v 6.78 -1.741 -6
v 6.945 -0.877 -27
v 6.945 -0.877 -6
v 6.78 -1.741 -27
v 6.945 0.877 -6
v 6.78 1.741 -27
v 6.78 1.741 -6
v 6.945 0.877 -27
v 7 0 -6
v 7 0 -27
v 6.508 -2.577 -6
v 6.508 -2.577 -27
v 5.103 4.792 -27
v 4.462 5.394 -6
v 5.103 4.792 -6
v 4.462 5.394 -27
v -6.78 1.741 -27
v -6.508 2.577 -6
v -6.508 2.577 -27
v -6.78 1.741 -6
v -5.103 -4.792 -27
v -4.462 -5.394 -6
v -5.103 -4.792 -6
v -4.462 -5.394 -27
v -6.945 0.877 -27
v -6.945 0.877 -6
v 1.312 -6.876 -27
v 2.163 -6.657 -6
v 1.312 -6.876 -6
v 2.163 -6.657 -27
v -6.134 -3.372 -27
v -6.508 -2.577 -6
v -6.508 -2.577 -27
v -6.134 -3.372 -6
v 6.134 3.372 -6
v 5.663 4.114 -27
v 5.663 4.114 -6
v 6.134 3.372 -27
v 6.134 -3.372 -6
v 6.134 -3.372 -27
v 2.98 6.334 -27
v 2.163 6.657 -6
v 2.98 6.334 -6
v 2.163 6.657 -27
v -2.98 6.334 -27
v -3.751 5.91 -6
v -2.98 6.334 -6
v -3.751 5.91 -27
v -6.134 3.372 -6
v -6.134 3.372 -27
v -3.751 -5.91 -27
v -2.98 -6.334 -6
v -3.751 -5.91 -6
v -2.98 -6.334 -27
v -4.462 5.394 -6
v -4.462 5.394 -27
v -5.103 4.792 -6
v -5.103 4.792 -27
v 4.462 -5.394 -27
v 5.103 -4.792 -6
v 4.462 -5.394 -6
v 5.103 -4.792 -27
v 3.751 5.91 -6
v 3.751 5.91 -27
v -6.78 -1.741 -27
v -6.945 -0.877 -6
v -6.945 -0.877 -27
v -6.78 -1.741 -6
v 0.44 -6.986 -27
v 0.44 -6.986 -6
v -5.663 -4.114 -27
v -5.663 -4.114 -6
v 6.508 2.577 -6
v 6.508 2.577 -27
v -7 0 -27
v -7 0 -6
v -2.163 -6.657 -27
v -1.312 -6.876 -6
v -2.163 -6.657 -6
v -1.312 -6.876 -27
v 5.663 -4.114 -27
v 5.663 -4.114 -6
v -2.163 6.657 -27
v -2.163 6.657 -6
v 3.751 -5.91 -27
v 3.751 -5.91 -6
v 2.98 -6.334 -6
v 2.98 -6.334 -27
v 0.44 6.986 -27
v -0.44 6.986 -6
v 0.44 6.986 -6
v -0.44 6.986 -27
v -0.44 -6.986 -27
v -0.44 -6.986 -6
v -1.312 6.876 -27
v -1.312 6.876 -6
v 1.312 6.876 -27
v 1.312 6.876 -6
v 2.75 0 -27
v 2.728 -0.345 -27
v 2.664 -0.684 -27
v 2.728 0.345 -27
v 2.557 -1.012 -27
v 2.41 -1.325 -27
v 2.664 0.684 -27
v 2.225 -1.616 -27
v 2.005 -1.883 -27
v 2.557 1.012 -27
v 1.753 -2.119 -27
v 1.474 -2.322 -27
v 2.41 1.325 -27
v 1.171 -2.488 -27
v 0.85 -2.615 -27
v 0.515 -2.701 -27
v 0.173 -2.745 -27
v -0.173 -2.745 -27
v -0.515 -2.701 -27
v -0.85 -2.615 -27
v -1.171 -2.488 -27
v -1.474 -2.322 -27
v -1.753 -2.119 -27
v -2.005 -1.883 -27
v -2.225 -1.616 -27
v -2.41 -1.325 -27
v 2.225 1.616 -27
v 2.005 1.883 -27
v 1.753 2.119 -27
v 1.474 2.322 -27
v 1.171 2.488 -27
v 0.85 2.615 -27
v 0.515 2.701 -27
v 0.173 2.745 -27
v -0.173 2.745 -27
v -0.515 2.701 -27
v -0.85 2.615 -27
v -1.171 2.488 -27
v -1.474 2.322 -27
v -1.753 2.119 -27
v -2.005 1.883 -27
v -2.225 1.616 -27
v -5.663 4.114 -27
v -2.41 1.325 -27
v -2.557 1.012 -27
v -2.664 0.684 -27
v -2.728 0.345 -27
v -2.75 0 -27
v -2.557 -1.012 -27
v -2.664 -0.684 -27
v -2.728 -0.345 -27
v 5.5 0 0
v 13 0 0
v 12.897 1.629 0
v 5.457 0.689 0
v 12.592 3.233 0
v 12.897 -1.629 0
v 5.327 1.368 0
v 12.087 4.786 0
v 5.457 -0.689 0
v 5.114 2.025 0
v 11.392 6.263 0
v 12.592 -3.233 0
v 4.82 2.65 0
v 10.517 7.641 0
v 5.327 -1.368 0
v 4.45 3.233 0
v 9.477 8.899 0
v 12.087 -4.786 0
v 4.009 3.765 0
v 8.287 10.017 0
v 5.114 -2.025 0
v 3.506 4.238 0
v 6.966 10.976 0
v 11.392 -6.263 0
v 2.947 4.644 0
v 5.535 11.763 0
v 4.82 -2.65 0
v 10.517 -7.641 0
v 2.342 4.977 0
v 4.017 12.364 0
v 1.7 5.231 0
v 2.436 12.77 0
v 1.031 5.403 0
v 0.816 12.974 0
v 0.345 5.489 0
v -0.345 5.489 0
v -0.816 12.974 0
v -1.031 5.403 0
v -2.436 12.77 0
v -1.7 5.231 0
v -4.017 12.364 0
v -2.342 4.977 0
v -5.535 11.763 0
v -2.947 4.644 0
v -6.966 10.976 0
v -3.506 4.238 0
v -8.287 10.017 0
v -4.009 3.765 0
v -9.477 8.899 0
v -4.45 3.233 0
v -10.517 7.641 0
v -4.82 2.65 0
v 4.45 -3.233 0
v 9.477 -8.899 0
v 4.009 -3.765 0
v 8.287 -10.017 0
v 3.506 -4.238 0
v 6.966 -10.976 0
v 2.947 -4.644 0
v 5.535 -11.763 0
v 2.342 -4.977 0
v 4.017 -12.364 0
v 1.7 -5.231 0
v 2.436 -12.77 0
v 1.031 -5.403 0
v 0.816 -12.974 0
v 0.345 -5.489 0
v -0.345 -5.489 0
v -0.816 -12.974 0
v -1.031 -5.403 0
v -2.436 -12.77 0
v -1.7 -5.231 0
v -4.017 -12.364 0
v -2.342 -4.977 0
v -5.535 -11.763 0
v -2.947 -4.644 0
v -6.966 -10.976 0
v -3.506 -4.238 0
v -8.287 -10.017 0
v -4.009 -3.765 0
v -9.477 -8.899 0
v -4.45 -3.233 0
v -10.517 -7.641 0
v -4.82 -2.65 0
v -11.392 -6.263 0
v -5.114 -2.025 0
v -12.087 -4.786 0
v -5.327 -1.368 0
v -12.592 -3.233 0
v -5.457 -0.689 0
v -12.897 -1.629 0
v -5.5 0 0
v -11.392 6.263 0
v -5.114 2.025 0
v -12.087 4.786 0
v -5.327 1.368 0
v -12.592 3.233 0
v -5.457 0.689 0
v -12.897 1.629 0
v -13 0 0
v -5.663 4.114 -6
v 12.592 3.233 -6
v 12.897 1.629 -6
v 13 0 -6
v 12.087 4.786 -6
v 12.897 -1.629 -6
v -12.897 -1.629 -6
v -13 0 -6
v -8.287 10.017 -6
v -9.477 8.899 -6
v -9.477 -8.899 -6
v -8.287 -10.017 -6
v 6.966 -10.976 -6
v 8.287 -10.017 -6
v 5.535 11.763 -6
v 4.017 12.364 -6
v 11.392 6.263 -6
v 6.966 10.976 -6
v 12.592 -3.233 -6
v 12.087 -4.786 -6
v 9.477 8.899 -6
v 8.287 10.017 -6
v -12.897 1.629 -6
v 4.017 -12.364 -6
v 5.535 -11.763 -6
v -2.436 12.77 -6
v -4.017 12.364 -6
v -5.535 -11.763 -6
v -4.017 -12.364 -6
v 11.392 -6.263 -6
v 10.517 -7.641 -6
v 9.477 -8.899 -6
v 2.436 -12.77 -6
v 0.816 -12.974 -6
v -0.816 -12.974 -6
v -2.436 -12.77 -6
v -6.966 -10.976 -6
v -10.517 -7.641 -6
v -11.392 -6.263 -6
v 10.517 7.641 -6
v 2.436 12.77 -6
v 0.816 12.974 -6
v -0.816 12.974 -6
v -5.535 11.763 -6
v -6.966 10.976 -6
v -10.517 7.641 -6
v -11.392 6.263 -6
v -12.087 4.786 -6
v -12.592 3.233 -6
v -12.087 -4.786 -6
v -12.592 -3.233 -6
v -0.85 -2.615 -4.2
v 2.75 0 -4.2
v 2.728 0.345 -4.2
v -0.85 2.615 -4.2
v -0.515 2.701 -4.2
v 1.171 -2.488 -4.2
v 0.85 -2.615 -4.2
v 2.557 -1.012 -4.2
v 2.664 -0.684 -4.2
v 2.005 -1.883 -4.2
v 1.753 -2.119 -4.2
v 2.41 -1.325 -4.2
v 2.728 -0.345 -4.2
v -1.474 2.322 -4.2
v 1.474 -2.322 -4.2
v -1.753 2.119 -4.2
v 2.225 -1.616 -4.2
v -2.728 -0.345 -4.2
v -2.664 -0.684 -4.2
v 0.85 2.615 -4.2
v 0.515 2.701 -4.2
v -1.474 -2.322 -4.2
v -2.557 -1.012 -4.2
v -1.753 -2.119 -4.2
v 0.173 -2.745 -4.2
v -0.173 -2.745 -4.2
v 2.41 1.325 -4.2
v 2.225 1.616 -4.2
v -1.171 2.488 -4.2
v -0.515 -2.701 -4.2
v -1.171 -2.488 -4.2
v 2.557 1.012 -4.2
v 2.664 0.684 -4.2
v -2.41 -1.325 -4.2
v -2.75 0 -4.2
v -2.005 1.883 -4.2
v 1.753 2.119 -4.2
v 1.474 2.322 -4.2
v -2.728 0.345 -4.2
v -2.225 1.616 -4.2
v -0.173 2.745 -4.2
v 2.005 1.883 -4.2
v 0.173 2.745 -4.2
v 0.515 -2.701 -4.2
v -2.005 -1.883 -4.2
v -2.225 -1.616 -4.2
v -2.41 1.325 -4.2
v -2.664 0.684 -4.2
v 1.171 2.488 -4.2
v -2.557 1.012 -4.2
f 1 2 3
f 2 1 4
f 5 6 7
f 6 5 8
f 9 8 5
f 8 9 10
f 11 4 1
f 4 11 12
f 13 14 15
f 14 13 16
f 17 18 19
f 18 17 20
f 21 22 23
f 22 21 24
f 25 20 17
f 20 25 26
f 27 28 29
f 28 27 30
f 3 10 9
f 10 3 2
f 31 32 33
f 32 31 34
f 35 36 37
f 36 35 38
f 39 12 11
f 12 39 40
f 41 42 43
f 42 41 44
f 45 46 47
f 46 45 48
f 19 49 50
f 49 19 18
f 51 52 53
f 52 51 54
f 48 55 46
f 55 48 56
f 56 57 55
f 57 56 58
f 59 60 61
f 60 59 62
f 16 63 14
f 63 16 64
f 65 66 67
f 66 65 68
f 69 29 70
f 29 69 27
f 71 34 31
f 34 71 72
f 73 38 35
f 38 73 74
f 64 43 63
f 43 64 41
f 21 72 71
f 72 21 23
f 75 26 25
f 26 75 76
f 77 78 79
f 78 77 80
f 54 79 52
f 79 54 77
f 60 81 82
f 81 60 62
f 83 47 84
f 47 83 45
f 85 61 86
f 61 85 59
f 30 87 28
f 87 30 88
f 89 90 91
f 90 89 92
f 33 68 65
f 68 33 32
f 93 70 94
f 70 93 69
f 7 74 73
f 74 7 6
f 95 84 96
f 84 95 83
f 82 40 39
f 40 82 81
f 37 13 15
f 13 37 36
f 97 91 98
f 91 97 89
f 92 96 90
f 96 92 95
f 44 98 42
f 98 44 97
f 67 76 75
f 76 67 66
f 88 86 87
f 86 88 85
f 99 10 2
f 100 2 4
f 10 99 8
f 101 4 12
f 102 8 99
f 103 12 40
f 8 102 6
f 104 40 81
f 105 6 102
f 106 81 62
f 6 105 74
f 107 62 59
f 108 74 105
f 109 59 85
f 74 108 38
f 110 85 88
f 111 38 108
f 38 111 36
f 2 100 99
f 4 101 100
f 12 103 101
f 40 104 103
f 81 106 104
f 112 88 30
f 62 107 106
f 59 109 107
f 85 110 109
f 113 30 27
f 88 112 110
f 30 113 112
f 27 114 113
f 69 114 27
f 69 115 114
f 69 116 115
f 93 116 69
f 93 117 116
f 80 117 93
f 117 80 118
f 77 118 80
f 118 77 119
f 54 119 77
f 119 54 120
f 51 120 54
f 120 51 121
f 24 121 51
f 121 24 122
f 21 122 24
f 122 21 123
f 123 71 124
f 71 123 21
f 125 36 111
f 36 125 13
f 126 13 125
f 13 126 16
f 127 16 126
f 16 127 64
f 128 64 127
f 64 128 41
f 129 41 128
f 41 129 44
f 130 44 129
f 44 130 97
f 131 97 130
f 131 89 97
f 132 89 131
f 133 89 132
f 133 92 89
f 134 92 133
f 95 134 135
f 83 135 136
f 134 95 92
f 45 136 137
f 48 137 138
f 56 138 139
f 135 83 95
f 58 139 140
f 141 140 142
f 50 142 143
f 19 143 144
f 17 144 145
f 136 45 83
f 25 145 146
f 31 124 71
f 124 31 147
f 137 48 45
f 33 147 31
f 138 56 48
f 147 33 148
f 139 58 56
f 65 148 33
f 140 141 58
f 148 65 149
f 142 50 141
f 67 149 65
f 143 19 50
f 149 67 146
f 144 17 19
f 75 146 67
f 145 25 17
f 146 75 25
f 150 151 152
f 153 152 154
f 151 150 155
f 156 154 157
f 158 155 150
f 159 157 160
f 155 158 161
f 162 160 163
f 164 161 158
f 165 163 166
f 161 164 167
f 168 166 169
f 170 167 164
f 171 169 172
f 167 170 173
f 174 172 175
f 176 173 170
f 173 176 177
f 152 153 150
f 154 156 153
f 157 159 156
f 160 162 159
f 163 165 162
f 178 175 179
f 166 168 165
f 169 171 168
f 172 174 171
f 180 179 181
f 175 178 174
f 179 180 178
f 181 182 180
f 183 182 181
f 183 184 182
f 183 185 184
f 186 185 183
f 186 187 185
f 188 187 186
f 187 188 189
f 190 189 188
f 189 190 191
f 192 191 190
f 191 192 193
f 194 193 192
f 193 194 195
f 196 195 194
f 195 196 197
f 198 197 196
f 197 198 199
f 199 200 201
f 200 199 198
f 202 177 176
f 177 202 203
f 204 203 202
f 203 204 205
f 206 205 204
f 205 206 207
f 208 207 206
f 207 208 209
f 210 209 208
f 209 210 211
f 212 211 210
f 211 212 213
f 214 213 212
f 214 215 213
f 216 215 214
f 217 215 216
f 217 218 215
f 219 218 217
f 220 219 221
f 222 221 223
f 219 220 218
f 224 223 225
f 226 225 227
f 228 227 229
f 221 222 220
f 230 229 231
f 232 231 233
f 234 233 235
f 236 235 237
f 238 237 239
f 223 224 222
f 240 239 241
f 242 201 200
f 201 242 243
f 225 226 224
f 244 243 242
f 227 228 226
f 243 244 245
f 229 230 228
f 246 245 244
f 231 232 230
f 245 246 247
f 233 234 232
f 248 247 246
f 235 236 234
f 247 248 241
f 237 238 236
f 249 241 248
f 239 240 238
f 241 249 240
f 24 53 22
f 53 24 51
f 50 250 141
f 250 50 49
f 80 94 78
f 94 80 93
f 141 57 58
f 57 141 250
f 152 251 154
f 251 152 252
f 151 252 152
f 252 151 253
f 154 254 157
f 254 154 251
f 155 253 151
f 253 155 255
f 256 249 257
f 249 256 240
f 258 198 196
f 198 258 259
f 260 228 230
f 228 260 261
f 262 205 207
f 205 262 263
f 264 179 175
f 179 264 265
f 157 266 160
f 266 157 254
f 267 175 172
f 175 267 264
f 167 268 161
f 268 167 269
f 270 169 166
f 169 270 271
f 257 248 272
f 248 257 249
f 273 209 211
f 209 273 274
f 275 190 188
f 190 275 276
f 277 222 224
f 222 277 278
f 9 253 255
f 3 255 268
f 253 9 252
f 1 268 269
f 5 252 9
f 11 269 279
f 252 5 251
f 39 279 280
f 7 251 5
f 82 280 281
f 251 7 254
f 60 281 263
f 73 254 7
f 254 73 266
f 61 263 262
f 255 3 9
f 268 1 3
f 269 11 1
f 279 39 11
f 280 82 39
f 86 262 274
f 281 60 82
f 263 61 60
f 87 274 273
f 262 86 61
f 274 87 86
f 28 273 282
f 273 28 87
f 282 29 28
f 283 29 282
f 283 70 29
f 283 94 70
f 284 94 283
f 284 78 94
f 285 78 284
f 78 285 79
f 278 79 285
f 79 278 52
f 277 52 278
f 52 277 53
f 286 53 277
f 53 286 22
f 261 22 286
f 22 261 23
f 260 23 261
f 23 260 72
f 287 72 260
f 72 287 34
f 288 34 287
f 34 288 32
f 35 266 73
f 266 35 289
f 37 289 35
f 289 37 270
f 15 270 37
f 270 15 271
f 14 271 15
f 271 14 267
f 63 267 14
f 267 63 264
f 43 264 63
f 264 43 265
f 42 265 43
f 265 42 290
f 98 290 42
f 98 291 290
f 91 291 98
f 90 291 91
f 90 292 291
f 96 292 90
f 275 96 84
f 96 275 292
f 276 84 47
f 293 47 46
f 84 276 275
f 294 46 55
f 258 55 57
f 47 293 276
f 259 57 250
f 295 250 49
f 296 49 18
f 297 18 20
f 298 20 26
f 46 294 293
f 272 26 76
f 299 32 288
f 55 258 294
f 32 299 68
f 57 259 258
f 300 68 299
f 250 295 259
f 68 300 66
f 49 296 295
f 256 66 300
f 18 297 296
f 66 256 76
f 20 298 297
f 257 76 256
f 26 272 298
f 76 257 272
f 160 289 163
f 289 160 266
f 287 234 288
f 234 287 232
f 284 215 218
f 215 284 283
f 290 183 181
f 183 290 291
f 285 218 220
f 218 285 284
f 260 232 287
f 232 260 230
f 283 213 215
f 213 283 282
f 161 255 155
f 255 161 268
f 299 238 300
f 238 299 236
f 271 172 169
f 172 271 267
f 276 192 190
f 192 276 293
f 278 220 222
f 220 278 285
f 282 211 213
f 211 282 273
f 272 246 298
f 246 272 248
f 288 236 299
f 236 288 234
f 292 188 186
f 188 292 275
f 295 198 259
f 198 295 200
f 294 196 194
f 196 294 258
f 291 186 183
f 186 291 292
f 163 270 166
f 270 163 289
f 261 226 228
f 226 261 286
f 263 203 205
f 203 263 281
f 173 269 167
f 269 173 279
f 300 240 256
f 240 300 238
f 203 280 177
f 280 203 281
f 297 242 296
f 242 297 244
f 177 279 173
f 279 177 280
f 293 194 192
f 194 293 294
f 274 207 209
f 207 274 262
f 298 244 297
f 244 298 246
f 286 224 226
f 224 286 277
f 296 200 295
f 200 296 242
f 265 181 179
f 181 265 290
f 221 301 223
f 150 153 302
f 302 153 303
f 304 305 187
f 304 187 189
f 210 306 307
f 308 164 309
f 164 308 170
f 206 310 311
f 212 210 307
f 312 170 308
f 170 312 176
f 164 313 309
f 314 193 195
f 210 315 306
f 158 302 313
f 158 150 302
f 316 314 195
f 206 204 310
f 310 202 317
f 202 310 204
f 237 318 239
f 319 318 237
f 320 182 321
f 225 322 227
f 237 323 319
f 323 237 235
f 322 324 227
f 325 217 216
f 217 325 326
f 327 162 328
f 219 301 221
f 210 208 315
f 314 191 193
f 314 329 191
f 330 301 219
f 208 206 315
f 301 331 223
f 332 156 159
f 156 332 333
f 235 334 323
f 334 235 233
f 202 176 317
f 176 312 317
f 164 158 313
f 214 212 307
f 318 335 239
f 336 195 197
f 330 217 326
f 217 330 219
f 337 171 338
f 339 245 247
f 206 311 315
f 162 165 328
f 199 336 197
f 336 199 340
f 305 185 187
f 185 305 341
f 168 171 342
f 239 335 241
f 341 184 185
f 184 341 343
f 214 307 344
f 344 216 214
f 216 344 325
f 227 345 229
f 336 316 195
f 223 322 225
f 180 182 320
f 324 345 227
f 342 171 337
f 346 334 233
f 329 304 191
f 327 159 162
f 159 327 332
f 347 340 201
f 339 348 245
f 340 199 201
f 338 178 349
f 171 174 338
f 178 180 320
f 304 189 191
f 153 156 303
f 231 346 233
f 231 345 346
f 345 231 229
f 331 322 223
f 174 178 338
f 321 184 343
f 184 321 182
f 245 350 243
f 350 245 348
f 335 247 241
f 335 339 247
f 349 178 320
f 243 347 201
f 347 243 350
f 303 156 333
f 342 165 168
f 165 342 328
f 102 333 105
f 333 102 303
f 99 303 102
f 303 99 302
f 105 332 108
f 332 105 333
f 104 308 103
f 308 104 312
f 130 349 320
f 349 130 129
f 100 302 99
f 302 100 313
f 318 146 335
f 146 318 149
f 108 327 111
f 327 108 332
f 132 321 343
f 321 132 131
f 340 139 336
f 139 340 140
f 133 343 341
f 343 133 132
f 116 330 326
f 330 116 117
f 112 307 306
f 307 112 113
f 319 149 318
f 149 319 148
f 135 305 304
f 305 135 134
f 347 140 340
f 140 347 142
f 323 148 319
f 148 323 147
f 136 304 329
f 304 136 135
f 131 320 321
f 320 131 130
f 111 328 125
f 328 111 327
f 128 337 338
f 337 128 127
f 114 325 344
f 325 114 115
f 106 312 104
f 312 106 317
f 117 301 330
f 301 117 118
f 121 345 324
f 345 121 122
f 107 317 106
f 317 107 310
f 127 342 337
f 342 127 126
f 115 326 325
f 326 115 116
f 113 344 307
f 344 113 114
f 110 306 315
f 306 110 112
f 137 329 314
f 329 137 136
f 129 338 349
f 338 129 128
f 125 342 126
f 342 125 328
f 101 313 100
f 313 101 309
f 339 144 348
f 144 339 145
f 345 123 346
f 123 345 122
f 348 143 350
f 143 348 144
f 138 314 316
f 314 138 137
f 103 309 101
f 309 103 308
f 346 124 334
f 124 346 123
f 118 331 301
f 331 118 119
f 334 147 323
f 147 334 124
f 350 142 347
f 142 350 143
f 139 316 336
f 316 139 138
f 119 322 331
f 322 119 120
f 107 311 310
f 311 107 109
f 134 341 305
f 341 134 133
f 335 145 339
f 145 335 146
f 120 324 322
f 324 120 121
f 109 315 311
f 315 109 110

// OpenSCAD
$fn = 50;


difference() {
	union() {
		translate(v = [0, 0, -27.0000000000]) {
			cylinder(h = 27, r = 7.0000000000);
		}
		translate(v = [0, 0, -6.0000000000]) {
			cylinder(h = 6, r = 13.0000000000);
		}
	}
	union() {
		translate(v = [0, 0, 0]) {
			rotate(a = [0, 0, 0]) {
				difference() {
					union() {
						#translate(v = [0, 0, -27.0000000000]) {
							cylinder(h = 27, r = 2.2500000000);
						}
						#translate(v = [0, 0, -4.2000000000]) {
							cylinder(h = 4.2000000000, r1 = 2.7500000000, r2 = 5.5000000000);
						}
						#translate(v = [0, 0, -27.0000000000]) {
							cylinder(h = 27, r = 2.7500000000);
						}
						#translate(v = [0, 0, -27.0000000000]) {
							cylinder(h = 27, r = 2.2500000000);
						}
					}
					union();
				}
			}
		}
	}
}
